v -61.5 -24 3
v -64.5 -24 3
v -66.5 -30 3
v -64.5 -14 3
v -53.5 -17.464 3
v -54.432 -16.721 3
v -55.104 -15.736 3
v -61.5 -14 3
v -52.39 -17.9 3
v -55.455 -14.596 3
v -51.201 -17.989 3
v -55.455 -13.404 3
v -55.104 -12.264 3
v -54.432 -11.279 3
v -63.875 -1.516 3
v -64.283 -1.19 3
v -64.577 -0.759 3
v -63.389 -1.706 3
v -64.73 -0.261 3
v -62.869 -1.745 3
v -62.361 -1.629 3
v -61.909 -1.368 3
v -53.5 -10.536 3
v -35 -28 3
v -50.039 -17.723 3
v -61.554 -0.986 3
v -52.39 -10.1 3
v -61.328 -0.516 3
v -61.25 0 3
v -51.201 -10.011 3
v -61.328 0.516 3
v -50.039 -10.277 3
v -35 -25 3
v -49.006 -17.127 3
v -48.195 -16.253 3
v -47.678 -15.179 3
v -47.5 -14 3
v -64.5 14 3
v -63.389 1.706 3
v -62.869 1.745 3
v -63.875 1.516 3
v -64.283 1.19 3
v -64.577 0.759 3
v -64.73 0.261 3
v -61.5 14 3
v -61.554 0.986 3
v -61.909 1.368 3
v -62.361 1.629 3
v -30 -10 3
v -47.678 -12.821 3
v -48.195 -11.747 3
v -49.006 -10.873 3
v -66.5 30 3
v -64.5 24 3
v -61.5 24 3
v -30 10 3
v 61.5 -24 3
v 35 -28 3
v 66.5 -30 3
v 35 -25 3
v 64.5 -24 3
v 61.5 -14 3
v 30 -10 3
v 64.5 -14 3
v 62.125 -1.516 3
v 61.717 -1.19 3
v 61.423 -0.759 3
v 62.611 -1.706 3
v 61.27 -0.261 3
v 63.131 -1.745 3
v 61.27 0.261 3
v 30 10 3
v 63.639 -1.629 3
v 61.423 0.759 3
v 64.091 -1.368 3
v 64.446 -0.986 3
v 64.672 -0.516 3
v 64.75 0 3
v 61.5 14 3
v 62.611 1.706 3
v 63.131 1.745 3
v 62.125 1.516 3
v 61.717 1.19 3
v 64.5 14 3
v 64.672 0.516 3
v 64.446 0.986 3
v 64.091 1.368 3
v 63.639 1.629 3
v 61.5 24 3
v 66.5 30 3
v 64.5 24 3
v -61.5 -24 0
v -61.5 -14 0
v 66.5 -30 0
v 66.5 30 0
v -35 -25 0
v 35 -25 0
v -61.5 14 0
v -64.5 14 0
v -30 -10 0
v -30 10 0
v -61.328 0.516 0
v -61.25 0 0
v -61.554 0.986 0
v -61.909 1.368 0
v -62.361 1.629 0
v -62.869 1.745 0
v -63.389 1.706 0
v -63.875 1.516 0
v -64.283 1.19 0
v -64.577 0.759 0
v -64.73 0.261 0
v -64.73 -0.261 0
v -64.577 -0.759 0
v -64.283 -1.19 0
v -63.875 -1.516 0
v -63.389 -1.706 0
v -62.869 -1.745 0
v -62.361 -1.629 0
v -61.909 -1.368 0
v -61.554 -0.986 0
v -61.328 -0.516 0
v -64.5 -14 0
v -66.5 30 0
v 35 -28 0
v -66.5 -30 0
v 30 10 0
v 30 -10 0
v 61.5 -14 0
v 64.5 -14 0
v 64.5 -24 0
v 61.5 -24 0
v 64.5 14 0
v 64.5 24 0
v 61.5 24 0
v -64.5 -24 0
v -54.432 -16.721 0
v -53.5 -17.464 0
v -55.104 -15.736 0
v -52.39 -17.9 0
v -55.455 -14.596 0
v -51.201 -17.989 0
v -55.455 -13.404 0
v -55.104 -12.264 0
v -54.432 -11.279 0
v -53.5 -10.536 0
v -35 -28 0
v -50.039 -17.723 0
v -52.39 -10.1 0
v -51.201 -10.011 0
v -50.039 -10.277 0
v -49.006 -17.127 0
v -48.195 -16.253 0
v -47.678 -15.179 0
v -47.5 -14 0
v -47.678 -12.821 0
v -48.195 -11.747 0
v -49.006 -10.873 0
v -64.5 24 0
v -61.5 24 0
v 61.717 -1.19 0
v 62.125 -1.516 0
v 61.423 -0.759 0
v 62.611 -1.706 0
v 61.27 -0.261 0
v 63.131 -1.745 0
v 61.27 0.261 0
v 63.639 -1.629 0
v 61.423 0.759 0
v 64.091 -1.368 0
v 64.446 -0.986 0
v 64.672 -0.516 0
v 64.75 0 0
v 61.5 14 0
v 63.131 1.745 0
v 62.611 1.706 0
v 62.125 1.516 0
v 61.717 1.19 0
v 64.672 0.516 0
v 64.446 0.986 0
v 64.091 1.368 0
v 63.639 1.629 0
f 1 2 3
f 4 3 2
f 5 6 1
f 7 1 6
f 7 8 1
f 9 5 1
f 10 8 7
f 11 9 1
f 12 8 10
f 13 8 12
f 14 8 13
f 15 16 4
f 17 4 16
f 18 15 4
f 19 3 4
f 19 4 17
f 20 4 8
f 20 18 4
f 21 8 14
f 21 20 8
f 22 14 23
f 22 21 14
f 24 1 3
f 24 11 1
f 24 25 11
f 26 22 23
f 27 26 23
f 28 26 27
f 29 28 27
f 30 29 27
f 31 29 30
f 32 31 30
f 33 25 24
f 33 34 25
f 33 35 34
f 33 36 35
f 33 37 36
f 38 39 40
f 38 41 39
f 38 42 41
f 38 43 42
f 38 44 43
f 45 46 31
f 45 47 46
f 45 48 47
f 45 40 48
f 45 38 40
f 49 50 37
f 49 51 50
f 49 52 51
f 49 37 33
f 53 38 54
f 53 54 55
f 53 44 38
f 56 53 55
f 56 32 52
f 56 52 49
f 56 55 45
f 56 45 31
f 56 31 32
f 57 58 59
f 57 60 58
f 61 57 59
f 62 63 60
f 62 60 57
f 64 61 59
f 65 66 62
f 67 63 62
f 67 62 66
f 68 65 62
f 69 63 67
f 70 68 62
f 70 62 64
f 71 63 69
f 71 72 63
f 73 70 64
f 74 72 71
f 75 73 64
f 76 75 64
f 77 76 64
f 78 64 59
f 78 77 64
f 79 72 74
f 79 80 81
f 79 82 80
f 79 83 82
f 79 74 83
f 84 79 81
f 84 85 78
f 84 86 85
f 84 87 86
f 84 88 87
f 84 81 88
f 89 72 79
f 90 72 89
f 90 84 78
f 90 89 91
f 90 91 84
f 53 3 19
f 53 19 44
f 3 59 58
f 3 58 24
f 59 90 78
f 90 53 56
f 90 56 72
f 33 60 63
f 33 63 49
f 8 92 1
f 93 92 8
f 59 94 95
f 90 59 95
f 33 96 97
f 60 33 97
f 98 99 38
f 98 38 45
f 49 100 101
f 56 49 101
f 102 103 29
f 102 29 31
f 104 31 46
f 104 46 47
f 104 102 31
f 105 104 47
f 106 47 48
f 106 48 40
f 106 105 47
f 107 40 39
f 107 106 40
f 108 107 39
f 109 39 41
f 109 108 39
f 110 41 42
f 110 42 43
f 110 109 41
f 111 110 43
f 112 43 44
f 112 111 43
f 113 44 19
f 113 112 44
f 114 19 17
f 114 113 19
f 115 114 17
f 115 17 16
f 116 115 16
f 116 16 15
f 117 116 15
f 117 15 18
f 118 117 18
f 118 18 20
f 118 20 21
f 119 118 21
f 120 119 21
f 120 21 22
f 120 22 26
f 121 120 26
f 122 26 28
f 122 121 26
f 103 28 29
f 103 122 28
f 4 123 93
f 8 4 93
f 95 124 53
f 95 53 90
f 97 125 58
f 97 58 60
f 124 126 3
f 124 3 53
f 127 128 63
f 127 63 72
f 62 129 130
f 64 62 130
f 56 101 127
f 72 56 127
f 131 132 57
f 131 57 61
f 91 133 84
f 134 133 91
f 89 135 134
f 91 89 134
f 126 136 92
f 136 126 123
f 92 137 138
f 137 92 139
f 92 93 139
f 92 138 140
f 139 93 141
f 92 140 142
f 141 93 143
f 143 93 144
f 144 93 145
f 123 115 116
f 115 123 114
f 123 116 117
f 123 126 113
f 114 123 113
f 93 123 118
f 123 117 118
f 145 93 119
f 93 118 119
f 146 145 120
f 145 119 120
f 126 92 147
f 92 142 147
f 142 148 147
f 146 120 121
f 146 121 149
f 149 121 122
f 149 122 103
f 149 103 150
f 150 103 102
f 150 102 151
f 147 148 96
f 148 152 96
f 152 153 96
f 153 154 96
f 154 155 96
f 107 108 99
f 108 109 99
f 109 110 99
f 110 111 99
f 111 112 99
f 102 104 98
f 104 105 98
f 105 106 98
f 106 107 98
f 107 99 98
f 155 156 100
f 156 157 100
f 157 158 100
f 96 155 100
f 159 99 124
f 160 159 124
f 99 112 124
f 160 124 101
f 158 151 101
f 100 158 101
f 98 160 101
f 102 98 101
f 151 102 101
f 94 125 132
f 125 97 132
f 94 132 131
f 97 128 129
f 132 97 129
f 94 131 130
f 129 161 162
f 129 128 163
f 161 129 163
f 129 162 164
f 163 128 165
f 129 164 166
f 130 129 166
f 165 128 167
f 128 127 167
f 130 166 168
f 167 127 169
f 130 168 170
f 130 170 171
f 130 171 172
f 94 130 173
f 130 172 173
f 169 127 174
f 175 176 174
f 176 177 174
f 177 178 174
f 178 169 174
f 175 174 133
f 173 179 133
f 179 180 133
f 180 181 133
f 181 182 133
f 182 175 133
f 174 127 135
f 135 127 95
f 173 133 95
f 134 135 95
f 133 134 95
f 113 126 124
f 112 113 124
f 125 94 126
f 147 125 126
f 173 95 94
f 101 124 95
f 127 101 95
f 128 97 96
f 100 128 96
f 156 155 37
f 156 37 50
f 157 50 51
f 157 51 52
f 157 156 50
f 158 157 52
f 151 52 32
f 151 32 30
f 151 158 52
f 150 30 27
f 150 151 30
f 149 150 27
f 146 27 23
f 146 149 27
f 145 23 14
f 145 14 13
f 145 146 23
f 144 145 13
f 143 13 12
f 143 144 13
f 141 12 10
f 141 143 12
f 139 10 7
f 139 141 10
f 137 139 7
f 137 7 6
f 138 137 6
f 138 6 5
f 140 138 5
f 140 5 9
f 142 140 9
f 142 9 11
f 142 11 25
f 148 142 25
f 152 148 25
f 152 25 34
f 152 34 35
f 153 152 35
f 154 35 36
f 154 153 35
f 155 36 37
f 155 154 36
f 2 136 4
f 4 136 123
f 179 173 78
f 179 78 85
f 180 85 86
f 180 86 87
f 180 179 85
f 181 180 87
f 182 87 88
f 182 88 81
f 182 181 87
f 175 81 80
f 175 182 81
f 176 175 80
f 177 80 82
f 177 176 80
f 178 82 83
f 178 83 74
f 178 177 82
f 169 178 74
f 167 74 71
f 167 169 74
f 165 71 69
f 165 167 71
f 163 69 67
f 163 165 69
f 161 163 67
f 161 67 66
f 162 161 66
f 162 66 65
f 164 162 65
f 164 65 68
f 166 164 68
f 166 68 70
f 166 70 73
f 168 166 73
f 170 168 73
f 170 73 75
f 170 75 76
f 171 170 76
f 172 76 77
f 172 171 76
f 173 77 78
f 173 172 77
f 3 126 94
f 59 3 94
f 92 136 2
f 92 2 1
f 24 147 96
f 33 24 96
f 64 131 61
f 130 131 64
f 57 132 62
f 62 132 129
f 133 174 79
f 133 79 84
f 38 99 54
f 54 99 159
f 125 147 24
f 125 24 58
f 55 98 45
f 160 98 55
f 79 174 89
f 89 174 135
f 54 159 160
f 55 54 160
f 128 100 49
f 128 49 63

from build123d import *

# Parameters (mm, degrees)
SKETCH1_W           = 133
SKETCH1_H           = 60
SKETCH1_R           = 4
SKETCH1_R_2         = 1.75
SKETCH1_W_2         = 3
SKETCH1_H_2         = 10
SKETCH1_W_3         = 60
SKETCH1_H_3         = 20
SKETCH1_W_4         = 70
SKETCH1_H_4         = 3
BOSS_EXTRUDE2_DEPTH = 3


with BuildPart() as part:
    # Sketch1 → Boss-Extrude2 (new body)
    with BuildSketch(Plane.XY):
        Rectangle(SKETCH1_W, SKETCH1_H)
        with Locations((-51.5, -14)):
            Circle(SKETCH1_R, mode=Mode.SUBTRACT)
        with Locations((-63, 0)):
            Circle(SKETCH1_R_2, mode=Mode.SUBTRACT)
        with Locations((63, 0)):
            Circle(SKETCH1_R_2, mode=Mode.SUBTRACT)
        with Locations((63, 19)):
            Rectangle(SKETCH1_W_2, SKETCH1_H_2, mode=Mode.SUBTRACT)
        Rectangle(SKETCH1_W_3, SKETCH1_H_3, mode=Mode.SUBTRACT)
        with Locations((0, -26.5)):
            Rectangle(SKETCH1_W_4, SKETCH1_H_4, mode=Mode.SUBTRACT)
        with Locations((-63, 19)):
            Rectangle(SKETCH1_W_2, SKETCH1_H_2, mode=Mode.SUBTRACT)
        with Locations((-63, -19)):
            Rectangle(SKETCH1_W_2, SKETCH1_H_2, mode=Mode.SUBTRACT)
        with Locations((63, -19)):
            Rectangle(SKETCH1_W_2, SKETCH1_H_2, mode=Mode.SUBTRACT)
    extrude(amount=BOSS_EXTRUDE2_DEPTH)


solid = part.part
